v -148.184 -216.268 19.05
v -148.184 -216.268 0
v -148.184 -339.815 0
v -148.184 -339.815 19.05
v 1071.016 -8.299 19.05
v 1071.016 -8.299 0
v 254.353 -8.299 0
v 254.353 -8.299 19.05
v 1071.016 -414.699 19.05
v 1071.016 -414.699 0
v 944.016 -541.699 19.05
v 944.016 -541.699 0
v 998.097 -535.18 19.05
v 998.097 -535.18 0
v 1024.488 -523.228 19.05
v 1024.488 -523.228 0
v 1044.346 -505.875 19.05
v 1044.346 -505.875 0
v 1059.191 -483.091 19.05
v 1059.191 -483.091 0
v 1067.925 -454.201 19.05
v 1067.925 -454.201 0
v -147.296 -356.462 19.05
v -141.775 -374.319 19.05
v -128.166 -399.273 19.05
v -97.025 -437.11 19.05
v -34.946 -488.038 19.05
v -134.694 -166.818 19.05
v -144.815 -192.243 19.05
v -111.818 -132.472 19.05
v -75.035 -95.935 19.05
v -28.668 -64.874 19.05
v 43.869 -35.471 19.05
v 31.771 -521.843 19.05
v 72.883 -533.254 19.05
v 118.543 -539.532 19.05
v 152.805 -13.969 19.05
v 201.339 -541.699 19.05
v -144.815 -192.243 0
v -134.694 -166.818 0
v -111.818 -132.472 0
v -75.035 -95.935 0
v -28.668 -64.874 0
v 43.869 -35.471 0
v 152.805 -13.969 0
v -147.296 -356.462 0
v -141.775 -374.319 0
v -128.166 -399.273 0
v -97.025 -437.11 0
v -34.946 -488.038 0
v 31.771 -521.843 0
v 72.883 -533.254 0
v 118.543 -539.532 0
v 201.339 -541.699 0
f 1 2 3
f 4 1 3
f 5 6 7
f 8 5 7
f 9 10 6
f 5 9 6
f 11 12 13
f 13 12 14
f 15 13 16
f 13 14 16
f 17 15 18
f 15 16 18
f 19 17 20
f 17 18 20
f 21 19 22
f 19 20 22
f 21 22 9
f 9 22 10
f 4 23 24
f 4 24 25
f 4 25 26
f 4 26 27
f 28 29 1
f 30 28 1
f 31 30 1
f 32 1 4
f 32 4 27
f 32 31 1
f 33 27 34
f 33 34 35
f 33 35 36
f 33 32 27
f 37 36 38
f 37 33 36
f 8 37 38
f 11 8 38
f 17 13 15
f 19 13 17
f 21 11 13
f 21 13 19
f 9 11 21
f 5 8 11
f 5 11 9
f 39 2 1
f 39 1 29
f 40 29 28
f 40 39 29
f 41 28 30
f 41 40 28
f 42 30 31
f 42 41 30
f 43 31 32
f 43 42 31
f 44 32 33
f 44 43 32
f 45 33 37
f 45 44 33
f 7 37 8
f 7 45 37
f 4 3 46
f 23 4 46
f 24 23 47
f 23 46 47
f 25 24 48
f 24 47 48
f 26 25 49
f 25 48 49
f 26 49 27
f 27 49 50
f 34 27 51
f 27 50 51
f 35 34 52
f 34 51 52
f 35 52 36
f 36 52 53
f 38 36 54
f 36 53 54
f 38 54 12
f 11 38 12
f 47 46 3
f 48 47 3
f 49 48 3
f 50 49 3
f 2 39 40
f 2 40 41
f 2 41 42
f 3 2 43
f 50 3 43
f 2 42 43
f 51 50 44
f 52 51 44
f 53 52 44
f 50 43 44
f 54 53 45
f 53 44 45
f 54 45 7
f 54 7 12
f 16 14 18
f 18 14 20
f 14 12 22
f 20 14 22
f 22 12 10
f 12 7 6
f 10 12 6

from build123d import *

# Parameters (mm, degrees)
F1_DEPTH = 19.05


with BuildPart() as f1:
    # F0 (on Top) → F1 (new body)
    with BuildSketch(Plane.XY):
        with BuildLine():
            Line((1071.0159201622, -8.2989922523), (254.3527232081, -8.2989922523))
            add(Edge.make_bspline(
                [(-148.1840798378, -216.2680476904), (-148.6435220602, -169.1820668459), (-44.4471985887, -28.6854879945), (169.1966929013, -8.4620483078), (254.3527232081, -8.2989922523)],
                knots=[0, 0, 0, 0, 0.4425410138, 1, 1, 1, 1], degree=3))
            Line((-148.1840798378, -216.2680476904), (-148.1840798378, -339.8153483868))
            add(Edge.make_bspline(
                [(-148.1840798378, -339.8153483868), (-153.4948728045, -392.1768578476), (0.9465640393, -546.4392561923), (137.8169712659, -541.1362554842), (201.3389880346, -541.6989922523)],
                knots=[0, 0, 0, 0, 0.5118383648, 1, 1, 1, 1], degree=3))
            Line((201.3389880346, -541.6989922523), (944.0159201622, -541.6989922523))
            add(Edge.make_bspline(
                [(944.0159201622, -541.6989922523), (995.8091974258, -541.6989922523), (1047.317173092, -516.7797955455), (1071.0159201622, -465.3031229973), (1071.0159201622, -414.6989922523)],
                knots=[0, 0, 0, 0, 0.5018573547, 1, 1, 1, 1], degree=3))
            Line((1071.0159201622, -414.6989922523), (1071.0159201622, -8.2989922523))
        make_face()
    extrude(amount=F1_DEPTH)


solid = f1.part
